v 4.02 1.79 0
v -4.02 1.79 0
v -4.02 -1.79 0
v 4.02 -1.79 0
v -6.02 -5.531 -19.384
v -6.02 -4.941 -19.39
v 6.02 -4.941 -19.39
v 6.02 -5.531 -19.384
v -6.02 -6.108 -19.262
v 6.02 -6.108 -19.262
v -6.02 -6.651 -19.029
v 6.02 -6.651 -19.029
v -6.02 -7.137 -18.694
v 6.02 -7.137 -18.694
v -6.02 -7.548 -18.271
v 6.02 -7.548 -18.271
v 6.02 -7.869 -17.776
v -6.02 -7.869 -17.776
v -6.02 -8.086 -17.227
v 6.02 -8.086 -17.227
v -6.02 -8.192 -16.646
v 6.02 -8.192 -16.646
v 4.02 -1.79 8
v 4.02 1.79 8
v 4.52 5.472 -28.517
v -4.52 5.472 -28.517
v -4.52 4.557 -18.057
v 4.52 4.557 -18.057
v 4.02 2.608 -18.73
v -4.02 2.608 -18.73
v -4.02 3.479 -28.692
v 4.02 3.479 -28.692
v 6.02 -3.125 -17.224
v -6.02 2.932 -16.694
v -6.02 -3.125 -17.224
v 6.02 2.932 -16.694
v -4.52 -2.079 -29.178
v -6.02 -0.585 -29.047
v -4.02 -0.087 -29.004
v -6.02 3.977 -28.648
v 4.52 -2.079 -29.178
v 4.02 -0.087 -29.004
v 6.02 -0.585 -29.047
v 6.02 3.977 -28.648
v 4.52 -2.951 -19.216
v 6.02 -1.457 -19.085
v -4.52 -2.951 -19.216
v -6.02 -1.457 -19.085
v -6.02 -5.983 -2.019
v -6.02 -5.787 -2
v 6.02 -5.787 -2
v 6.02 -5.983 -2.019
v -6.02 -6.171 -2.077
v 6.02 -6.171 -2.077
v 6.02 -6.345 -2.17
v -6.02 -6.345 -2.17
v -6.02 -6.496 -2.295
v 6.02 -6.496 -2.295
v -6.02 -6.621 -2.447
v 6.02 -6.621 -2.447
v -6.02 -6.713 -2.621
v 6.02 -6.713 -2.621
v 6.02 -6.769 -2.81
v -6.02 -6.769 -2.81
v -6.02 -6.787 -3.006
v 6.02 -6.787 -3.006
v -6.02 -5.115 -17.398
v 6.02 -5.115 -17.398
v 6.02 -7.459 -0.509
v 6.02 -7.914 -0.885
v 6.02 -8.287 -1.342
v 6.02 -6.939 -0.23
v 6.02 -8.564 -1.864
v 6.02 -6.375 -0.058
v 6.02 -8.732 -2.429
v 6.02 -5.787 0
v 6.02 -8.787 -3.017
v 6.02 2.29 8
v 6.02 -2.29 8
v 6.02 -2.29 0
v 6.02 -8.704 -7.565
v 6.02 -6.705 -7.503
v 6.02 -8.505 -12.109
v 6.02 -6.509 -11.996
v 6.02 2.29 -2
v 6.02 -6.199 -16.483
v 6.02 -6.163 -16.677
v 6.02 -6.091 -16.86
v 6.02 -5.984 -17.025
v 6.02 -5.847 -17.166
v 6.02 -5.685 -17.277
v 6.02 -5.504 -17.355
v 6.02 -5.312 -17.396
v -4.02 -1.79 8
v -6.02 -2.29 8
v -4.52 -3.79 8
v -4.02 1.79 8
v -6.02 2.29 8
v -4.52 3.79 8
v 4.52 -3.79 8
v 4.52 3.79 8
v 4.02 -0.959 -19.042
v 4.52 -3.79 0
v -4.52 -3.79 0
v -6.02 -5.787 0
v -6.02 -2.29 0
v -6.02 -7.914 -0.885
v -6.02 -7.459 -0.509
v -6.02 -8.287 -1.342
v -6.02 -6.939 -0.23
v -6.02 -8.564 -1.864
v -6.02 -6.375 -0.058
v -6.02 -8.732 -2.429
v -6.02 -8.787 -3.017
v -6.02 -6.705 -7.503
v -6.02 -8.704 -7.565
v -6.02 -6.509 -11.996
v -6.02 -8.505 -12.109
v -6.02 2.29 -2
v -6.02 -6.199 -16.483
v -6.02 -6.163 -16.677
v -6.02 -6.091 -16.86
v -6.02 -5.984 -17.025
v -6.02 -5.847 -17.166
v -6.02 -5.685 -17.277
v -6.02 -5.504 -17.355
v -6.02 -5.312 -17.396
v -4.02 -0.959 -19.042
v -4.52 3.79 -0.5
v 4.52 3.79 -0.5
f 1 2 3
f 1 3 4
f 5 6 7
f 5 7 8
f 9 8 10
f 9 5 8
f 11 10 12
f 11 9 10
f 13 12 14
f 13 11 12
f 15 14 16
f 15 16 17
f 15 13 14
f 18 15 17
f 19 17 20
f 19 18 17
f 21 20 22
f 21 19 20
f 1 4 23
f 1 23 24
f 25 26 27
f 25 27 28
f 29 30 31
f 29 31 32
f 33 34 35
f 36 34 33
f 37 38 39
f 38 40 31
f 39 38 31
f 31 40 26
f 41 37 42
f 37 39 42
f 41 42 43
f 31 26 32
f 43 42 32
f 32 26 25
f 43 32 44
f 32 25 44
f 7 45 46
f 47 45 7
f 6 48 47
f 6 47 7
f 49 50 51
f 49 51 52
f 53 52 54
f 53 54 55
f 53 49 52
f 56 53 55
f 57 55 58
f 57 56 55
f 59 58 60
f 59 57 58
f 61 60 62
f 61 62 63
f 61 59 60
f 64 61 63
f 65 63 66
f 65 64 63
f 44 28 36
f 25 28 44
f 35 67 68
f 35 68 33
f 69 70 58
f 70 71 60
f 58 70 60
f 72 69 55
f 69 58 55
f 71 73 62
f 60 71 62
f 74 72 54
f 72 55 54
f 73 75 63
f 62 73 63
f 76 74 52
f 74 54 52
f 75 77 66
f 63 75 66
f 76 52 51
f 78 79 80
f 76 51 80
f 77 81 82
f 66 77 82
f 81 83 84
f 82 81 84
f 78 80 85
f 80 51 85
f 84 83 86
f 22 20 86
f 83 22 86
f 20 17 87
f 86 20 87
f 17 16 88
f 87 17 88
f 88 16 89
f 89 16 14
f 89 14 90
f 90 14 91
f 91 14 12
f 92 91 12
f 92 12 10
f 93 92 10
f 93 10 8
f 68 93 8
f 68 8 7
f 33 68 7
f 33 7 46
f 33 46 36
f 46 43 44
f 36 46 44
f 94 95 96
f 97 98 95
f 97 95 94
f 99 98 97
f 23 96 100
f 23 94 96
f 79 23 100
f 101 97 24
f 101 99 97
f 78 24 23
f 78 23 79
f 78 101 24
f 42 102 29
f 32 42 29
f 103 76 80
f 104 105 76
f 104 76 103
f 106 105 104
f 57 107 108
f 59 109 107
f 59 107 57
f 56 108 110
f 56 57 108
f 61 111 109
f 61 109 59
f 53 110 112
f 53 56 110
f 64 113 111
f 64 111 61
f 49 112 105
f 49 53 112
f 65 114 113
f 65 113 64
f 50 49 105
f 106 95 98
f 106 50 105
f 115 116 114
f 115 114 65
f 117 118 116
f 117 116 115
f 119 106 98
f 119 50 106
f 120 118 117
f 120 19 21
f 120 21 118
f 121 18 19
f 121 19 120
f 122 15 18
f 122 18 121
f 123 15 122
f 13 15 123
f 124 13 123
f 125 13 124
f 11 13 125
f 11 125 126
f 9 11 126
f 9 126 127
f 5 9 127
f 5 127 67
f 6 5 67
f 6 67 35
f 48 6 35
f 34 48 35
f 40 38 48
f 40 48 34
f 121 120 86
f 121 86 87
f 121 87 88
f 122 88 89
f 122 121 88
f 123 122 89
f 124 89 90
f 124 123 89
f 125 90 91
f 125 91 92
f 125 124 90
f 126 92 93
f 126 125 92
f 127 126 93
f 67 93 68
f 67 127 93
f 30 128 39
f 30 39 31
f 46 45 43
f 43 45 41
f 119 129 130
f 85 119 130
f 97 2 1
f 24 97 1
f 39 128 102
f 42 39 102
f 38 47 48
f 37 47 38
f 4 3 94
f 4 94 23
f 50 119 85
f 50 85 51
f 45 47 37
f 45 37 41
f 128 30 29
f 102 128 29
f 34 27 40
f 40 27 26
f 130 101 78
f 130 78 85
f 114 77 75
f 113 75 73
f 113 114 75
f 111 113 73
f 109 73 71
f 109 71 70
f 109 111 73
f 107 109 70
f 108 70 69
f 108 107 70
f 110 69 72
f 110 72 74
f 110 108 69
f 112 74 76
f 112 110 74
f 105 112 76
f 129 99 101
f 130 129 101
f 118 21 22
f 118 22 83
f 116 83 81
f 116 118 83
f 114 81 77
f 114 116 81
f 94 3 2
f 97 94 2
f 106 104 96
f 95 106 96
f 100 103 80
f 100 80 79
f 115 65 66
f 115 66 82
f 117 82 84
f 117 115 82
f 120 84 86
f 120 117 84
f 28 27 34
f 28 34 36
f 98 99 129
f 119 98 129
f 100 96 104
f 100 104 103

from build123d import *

# Parameters (mm, degrees)
SKETCH1_W           = 12.04
SKETCH1_H           = 7.58
SKETCH1_W_2         = 8.04
SKETCH1_H_2         = 3.58
BOSS_EXTRUDE1_DEPTH = 8
SKETCH1_2_W         = 12.04
SKETCH1_2_H         = 7.58
SKETCH1_2_W_2       = 8.04
SKETCH1_2_H_2       = 3.58
BOSS_EXTRUDE2_DEPTH = 2
EXTRUDE_THIN1_START = -12.04
EXTRUDE_THIN1_DEPTH = 12.04
SKETCH5_W           = 12.04
SKETCH5_H           = 7.58
SKETCH5_W_2         = 8.04
SKETCH5_H_2         = 3.58
BOSS_EXTRUDE4_DEPTH = 10
SKETCH5_4_W         = 12.04
SKETCH5_4_H         = 7.58
BOSS_EXTRUDE5_DEPTH = 2
CHAMFER1_SIZE       = 1.5


with BuildPart() as part:
    # Sketch1 → Boss-Extrude1 (new body)
    with BuildSketch(Plane.XY):
        Rectangle(SKETCH1_W, SKETCH1_H)
        Rectangle(SKETCH1_W_2, SKETCH1_H_2, mode=Mode.SUBTRACT)
    extrude(amount=BOSS_EXTRUDE1_DEPTH)

    # Sketch1<2> → Boss-Extrude2 (add)
    # profile 1 of 2: a face of its own
    with BuildSketch(Plane.XY):
        Rectangle(SKETCH1_2_W, SKETCH1_2_H)
        Rectangle(SKETCH1_2_W_2, SKETCH1_2_H_2, mode=Mode.SUBTRACT)
    # profile 2 of 2: a face of its own
    with BuildSketch(Plane.XY):
        Rectangle(SKETCH1_2_W_2, SKETCH1_2_H_2)
    extrude(amount=-BOSS_EXTRUDE2_DEPTH)

    # Sketch3 → Extrude-Thin1 (add)
    with BuildSketch(Plane(origin=(6.02, 9.81, 0), x_dir=(0, -1, 0), z_dir=(1, 0, 0)).offset(EXTRUDE_THIN1_START)):
        with BuildLine():
            Line((13.6, 2), (15.597169895, 2))
            ThreePointArc((15.597169895, 2), (16.306275023, 2.294897229), (16.597153876, 3.005660165))
            ThreePointArc((16.597153876, 3.005660165), (16.430894398, 9.75), (16.008713261, 16.483166054))
            ThreePointArc((16.008713261, 16.483166054), (15.656994218, 17.16587256), (14.924885462, 17.397845032))
            Line((14.924885462, 17.397845032), (12.935315402, 17.223780206))
            Line((12.935315402, 17.223780206), (12.761003916, 19.216169602))
            Line((12.761003916, 19.216169602), (14.750573976, 19.390234428))
            ThreePointArc((14.750573976, 19.390234428), (16.946900244, 18.694317012), (18.002057373, 16.646197494))
            ThreePointArc((18.002057373, 16.646197494), (18.428990842, 9.837238775), (18.597121838, 3.016980496))
            ThreePointArc((18.597121838, 3.016980496), (17.724485279, 0.884691688), (15.597169895, 0))
            Line((15.597169895, 0), (13.6, 0))
            Line((13.6, 0), (13.6, 2))
        make_face()
    extrude(amount=EXTRUDE_THIN1_DEPTH)



with BuildPart() as body_2:
    # Sketch5 → Boss-Extrude4 (new body)
    with BuildSketch(Plane(origin=(0, -2.104915883, -19.142146491), x_dir=(1, 0, 0), z_dir=(0, -0.08715574274765182, 0.9961946980917462))):
        with Locations((0, 2.940680048)):
            Rectangle(SKETCH5_W, SKETCH5_H)
        with Locations((0, 2.940680048)):
            Rectangle(SKETCH5_W_2, SKETCH5_H_2, mode=Mode.SUBTRACT)
    extrude(amount=-BOSS_EXTRUDE4_DEPTH)


with BuildPart() as part_1:
    add(part.part)

    add(body_2.part)  # Boss-Extrude5 merges body 2
    # Sketch5<4> → Boss-Extrude5 (add)
    with BuildSketch(Plane(origin=(0, -2.104915883, -19.142146491), x_dir=(1, 0, 0), z_dir=(0, -0.08715574274765182, 0.9961946980917462))):
        with Locations((0, 2.940680048)):
            Rectangle(SKETCH5_4_W, SKETCH5_4_H)
    extrude(amount=BOSS_EXTRUDE5_DEPTH)

    # Chamfer1
    chamfer1_edges = [part_1.edges().sort_by_distance(p)[0] for p in [
        (6.02, -2.515225202, -24.197143093),
        (-6.02, -2.515225202, -24.197143093),
        (0, 3.79, -2),
        (6.02, -3.79, 4),
        (-6.02, -3.79, 4),
        (-6.02, 3.79, 3),
        (6.02, 3.79, 3),
        (0, 4.42584041, -16.563139676),
        (6.02, 4.948774866, -22.540307865),
        (-6.02, 4.948774866, -22.540307865),
    ]]
    chamfer(chamfer1_edges, length=CHAMFER1_SIZE)


solid = part_1.part
